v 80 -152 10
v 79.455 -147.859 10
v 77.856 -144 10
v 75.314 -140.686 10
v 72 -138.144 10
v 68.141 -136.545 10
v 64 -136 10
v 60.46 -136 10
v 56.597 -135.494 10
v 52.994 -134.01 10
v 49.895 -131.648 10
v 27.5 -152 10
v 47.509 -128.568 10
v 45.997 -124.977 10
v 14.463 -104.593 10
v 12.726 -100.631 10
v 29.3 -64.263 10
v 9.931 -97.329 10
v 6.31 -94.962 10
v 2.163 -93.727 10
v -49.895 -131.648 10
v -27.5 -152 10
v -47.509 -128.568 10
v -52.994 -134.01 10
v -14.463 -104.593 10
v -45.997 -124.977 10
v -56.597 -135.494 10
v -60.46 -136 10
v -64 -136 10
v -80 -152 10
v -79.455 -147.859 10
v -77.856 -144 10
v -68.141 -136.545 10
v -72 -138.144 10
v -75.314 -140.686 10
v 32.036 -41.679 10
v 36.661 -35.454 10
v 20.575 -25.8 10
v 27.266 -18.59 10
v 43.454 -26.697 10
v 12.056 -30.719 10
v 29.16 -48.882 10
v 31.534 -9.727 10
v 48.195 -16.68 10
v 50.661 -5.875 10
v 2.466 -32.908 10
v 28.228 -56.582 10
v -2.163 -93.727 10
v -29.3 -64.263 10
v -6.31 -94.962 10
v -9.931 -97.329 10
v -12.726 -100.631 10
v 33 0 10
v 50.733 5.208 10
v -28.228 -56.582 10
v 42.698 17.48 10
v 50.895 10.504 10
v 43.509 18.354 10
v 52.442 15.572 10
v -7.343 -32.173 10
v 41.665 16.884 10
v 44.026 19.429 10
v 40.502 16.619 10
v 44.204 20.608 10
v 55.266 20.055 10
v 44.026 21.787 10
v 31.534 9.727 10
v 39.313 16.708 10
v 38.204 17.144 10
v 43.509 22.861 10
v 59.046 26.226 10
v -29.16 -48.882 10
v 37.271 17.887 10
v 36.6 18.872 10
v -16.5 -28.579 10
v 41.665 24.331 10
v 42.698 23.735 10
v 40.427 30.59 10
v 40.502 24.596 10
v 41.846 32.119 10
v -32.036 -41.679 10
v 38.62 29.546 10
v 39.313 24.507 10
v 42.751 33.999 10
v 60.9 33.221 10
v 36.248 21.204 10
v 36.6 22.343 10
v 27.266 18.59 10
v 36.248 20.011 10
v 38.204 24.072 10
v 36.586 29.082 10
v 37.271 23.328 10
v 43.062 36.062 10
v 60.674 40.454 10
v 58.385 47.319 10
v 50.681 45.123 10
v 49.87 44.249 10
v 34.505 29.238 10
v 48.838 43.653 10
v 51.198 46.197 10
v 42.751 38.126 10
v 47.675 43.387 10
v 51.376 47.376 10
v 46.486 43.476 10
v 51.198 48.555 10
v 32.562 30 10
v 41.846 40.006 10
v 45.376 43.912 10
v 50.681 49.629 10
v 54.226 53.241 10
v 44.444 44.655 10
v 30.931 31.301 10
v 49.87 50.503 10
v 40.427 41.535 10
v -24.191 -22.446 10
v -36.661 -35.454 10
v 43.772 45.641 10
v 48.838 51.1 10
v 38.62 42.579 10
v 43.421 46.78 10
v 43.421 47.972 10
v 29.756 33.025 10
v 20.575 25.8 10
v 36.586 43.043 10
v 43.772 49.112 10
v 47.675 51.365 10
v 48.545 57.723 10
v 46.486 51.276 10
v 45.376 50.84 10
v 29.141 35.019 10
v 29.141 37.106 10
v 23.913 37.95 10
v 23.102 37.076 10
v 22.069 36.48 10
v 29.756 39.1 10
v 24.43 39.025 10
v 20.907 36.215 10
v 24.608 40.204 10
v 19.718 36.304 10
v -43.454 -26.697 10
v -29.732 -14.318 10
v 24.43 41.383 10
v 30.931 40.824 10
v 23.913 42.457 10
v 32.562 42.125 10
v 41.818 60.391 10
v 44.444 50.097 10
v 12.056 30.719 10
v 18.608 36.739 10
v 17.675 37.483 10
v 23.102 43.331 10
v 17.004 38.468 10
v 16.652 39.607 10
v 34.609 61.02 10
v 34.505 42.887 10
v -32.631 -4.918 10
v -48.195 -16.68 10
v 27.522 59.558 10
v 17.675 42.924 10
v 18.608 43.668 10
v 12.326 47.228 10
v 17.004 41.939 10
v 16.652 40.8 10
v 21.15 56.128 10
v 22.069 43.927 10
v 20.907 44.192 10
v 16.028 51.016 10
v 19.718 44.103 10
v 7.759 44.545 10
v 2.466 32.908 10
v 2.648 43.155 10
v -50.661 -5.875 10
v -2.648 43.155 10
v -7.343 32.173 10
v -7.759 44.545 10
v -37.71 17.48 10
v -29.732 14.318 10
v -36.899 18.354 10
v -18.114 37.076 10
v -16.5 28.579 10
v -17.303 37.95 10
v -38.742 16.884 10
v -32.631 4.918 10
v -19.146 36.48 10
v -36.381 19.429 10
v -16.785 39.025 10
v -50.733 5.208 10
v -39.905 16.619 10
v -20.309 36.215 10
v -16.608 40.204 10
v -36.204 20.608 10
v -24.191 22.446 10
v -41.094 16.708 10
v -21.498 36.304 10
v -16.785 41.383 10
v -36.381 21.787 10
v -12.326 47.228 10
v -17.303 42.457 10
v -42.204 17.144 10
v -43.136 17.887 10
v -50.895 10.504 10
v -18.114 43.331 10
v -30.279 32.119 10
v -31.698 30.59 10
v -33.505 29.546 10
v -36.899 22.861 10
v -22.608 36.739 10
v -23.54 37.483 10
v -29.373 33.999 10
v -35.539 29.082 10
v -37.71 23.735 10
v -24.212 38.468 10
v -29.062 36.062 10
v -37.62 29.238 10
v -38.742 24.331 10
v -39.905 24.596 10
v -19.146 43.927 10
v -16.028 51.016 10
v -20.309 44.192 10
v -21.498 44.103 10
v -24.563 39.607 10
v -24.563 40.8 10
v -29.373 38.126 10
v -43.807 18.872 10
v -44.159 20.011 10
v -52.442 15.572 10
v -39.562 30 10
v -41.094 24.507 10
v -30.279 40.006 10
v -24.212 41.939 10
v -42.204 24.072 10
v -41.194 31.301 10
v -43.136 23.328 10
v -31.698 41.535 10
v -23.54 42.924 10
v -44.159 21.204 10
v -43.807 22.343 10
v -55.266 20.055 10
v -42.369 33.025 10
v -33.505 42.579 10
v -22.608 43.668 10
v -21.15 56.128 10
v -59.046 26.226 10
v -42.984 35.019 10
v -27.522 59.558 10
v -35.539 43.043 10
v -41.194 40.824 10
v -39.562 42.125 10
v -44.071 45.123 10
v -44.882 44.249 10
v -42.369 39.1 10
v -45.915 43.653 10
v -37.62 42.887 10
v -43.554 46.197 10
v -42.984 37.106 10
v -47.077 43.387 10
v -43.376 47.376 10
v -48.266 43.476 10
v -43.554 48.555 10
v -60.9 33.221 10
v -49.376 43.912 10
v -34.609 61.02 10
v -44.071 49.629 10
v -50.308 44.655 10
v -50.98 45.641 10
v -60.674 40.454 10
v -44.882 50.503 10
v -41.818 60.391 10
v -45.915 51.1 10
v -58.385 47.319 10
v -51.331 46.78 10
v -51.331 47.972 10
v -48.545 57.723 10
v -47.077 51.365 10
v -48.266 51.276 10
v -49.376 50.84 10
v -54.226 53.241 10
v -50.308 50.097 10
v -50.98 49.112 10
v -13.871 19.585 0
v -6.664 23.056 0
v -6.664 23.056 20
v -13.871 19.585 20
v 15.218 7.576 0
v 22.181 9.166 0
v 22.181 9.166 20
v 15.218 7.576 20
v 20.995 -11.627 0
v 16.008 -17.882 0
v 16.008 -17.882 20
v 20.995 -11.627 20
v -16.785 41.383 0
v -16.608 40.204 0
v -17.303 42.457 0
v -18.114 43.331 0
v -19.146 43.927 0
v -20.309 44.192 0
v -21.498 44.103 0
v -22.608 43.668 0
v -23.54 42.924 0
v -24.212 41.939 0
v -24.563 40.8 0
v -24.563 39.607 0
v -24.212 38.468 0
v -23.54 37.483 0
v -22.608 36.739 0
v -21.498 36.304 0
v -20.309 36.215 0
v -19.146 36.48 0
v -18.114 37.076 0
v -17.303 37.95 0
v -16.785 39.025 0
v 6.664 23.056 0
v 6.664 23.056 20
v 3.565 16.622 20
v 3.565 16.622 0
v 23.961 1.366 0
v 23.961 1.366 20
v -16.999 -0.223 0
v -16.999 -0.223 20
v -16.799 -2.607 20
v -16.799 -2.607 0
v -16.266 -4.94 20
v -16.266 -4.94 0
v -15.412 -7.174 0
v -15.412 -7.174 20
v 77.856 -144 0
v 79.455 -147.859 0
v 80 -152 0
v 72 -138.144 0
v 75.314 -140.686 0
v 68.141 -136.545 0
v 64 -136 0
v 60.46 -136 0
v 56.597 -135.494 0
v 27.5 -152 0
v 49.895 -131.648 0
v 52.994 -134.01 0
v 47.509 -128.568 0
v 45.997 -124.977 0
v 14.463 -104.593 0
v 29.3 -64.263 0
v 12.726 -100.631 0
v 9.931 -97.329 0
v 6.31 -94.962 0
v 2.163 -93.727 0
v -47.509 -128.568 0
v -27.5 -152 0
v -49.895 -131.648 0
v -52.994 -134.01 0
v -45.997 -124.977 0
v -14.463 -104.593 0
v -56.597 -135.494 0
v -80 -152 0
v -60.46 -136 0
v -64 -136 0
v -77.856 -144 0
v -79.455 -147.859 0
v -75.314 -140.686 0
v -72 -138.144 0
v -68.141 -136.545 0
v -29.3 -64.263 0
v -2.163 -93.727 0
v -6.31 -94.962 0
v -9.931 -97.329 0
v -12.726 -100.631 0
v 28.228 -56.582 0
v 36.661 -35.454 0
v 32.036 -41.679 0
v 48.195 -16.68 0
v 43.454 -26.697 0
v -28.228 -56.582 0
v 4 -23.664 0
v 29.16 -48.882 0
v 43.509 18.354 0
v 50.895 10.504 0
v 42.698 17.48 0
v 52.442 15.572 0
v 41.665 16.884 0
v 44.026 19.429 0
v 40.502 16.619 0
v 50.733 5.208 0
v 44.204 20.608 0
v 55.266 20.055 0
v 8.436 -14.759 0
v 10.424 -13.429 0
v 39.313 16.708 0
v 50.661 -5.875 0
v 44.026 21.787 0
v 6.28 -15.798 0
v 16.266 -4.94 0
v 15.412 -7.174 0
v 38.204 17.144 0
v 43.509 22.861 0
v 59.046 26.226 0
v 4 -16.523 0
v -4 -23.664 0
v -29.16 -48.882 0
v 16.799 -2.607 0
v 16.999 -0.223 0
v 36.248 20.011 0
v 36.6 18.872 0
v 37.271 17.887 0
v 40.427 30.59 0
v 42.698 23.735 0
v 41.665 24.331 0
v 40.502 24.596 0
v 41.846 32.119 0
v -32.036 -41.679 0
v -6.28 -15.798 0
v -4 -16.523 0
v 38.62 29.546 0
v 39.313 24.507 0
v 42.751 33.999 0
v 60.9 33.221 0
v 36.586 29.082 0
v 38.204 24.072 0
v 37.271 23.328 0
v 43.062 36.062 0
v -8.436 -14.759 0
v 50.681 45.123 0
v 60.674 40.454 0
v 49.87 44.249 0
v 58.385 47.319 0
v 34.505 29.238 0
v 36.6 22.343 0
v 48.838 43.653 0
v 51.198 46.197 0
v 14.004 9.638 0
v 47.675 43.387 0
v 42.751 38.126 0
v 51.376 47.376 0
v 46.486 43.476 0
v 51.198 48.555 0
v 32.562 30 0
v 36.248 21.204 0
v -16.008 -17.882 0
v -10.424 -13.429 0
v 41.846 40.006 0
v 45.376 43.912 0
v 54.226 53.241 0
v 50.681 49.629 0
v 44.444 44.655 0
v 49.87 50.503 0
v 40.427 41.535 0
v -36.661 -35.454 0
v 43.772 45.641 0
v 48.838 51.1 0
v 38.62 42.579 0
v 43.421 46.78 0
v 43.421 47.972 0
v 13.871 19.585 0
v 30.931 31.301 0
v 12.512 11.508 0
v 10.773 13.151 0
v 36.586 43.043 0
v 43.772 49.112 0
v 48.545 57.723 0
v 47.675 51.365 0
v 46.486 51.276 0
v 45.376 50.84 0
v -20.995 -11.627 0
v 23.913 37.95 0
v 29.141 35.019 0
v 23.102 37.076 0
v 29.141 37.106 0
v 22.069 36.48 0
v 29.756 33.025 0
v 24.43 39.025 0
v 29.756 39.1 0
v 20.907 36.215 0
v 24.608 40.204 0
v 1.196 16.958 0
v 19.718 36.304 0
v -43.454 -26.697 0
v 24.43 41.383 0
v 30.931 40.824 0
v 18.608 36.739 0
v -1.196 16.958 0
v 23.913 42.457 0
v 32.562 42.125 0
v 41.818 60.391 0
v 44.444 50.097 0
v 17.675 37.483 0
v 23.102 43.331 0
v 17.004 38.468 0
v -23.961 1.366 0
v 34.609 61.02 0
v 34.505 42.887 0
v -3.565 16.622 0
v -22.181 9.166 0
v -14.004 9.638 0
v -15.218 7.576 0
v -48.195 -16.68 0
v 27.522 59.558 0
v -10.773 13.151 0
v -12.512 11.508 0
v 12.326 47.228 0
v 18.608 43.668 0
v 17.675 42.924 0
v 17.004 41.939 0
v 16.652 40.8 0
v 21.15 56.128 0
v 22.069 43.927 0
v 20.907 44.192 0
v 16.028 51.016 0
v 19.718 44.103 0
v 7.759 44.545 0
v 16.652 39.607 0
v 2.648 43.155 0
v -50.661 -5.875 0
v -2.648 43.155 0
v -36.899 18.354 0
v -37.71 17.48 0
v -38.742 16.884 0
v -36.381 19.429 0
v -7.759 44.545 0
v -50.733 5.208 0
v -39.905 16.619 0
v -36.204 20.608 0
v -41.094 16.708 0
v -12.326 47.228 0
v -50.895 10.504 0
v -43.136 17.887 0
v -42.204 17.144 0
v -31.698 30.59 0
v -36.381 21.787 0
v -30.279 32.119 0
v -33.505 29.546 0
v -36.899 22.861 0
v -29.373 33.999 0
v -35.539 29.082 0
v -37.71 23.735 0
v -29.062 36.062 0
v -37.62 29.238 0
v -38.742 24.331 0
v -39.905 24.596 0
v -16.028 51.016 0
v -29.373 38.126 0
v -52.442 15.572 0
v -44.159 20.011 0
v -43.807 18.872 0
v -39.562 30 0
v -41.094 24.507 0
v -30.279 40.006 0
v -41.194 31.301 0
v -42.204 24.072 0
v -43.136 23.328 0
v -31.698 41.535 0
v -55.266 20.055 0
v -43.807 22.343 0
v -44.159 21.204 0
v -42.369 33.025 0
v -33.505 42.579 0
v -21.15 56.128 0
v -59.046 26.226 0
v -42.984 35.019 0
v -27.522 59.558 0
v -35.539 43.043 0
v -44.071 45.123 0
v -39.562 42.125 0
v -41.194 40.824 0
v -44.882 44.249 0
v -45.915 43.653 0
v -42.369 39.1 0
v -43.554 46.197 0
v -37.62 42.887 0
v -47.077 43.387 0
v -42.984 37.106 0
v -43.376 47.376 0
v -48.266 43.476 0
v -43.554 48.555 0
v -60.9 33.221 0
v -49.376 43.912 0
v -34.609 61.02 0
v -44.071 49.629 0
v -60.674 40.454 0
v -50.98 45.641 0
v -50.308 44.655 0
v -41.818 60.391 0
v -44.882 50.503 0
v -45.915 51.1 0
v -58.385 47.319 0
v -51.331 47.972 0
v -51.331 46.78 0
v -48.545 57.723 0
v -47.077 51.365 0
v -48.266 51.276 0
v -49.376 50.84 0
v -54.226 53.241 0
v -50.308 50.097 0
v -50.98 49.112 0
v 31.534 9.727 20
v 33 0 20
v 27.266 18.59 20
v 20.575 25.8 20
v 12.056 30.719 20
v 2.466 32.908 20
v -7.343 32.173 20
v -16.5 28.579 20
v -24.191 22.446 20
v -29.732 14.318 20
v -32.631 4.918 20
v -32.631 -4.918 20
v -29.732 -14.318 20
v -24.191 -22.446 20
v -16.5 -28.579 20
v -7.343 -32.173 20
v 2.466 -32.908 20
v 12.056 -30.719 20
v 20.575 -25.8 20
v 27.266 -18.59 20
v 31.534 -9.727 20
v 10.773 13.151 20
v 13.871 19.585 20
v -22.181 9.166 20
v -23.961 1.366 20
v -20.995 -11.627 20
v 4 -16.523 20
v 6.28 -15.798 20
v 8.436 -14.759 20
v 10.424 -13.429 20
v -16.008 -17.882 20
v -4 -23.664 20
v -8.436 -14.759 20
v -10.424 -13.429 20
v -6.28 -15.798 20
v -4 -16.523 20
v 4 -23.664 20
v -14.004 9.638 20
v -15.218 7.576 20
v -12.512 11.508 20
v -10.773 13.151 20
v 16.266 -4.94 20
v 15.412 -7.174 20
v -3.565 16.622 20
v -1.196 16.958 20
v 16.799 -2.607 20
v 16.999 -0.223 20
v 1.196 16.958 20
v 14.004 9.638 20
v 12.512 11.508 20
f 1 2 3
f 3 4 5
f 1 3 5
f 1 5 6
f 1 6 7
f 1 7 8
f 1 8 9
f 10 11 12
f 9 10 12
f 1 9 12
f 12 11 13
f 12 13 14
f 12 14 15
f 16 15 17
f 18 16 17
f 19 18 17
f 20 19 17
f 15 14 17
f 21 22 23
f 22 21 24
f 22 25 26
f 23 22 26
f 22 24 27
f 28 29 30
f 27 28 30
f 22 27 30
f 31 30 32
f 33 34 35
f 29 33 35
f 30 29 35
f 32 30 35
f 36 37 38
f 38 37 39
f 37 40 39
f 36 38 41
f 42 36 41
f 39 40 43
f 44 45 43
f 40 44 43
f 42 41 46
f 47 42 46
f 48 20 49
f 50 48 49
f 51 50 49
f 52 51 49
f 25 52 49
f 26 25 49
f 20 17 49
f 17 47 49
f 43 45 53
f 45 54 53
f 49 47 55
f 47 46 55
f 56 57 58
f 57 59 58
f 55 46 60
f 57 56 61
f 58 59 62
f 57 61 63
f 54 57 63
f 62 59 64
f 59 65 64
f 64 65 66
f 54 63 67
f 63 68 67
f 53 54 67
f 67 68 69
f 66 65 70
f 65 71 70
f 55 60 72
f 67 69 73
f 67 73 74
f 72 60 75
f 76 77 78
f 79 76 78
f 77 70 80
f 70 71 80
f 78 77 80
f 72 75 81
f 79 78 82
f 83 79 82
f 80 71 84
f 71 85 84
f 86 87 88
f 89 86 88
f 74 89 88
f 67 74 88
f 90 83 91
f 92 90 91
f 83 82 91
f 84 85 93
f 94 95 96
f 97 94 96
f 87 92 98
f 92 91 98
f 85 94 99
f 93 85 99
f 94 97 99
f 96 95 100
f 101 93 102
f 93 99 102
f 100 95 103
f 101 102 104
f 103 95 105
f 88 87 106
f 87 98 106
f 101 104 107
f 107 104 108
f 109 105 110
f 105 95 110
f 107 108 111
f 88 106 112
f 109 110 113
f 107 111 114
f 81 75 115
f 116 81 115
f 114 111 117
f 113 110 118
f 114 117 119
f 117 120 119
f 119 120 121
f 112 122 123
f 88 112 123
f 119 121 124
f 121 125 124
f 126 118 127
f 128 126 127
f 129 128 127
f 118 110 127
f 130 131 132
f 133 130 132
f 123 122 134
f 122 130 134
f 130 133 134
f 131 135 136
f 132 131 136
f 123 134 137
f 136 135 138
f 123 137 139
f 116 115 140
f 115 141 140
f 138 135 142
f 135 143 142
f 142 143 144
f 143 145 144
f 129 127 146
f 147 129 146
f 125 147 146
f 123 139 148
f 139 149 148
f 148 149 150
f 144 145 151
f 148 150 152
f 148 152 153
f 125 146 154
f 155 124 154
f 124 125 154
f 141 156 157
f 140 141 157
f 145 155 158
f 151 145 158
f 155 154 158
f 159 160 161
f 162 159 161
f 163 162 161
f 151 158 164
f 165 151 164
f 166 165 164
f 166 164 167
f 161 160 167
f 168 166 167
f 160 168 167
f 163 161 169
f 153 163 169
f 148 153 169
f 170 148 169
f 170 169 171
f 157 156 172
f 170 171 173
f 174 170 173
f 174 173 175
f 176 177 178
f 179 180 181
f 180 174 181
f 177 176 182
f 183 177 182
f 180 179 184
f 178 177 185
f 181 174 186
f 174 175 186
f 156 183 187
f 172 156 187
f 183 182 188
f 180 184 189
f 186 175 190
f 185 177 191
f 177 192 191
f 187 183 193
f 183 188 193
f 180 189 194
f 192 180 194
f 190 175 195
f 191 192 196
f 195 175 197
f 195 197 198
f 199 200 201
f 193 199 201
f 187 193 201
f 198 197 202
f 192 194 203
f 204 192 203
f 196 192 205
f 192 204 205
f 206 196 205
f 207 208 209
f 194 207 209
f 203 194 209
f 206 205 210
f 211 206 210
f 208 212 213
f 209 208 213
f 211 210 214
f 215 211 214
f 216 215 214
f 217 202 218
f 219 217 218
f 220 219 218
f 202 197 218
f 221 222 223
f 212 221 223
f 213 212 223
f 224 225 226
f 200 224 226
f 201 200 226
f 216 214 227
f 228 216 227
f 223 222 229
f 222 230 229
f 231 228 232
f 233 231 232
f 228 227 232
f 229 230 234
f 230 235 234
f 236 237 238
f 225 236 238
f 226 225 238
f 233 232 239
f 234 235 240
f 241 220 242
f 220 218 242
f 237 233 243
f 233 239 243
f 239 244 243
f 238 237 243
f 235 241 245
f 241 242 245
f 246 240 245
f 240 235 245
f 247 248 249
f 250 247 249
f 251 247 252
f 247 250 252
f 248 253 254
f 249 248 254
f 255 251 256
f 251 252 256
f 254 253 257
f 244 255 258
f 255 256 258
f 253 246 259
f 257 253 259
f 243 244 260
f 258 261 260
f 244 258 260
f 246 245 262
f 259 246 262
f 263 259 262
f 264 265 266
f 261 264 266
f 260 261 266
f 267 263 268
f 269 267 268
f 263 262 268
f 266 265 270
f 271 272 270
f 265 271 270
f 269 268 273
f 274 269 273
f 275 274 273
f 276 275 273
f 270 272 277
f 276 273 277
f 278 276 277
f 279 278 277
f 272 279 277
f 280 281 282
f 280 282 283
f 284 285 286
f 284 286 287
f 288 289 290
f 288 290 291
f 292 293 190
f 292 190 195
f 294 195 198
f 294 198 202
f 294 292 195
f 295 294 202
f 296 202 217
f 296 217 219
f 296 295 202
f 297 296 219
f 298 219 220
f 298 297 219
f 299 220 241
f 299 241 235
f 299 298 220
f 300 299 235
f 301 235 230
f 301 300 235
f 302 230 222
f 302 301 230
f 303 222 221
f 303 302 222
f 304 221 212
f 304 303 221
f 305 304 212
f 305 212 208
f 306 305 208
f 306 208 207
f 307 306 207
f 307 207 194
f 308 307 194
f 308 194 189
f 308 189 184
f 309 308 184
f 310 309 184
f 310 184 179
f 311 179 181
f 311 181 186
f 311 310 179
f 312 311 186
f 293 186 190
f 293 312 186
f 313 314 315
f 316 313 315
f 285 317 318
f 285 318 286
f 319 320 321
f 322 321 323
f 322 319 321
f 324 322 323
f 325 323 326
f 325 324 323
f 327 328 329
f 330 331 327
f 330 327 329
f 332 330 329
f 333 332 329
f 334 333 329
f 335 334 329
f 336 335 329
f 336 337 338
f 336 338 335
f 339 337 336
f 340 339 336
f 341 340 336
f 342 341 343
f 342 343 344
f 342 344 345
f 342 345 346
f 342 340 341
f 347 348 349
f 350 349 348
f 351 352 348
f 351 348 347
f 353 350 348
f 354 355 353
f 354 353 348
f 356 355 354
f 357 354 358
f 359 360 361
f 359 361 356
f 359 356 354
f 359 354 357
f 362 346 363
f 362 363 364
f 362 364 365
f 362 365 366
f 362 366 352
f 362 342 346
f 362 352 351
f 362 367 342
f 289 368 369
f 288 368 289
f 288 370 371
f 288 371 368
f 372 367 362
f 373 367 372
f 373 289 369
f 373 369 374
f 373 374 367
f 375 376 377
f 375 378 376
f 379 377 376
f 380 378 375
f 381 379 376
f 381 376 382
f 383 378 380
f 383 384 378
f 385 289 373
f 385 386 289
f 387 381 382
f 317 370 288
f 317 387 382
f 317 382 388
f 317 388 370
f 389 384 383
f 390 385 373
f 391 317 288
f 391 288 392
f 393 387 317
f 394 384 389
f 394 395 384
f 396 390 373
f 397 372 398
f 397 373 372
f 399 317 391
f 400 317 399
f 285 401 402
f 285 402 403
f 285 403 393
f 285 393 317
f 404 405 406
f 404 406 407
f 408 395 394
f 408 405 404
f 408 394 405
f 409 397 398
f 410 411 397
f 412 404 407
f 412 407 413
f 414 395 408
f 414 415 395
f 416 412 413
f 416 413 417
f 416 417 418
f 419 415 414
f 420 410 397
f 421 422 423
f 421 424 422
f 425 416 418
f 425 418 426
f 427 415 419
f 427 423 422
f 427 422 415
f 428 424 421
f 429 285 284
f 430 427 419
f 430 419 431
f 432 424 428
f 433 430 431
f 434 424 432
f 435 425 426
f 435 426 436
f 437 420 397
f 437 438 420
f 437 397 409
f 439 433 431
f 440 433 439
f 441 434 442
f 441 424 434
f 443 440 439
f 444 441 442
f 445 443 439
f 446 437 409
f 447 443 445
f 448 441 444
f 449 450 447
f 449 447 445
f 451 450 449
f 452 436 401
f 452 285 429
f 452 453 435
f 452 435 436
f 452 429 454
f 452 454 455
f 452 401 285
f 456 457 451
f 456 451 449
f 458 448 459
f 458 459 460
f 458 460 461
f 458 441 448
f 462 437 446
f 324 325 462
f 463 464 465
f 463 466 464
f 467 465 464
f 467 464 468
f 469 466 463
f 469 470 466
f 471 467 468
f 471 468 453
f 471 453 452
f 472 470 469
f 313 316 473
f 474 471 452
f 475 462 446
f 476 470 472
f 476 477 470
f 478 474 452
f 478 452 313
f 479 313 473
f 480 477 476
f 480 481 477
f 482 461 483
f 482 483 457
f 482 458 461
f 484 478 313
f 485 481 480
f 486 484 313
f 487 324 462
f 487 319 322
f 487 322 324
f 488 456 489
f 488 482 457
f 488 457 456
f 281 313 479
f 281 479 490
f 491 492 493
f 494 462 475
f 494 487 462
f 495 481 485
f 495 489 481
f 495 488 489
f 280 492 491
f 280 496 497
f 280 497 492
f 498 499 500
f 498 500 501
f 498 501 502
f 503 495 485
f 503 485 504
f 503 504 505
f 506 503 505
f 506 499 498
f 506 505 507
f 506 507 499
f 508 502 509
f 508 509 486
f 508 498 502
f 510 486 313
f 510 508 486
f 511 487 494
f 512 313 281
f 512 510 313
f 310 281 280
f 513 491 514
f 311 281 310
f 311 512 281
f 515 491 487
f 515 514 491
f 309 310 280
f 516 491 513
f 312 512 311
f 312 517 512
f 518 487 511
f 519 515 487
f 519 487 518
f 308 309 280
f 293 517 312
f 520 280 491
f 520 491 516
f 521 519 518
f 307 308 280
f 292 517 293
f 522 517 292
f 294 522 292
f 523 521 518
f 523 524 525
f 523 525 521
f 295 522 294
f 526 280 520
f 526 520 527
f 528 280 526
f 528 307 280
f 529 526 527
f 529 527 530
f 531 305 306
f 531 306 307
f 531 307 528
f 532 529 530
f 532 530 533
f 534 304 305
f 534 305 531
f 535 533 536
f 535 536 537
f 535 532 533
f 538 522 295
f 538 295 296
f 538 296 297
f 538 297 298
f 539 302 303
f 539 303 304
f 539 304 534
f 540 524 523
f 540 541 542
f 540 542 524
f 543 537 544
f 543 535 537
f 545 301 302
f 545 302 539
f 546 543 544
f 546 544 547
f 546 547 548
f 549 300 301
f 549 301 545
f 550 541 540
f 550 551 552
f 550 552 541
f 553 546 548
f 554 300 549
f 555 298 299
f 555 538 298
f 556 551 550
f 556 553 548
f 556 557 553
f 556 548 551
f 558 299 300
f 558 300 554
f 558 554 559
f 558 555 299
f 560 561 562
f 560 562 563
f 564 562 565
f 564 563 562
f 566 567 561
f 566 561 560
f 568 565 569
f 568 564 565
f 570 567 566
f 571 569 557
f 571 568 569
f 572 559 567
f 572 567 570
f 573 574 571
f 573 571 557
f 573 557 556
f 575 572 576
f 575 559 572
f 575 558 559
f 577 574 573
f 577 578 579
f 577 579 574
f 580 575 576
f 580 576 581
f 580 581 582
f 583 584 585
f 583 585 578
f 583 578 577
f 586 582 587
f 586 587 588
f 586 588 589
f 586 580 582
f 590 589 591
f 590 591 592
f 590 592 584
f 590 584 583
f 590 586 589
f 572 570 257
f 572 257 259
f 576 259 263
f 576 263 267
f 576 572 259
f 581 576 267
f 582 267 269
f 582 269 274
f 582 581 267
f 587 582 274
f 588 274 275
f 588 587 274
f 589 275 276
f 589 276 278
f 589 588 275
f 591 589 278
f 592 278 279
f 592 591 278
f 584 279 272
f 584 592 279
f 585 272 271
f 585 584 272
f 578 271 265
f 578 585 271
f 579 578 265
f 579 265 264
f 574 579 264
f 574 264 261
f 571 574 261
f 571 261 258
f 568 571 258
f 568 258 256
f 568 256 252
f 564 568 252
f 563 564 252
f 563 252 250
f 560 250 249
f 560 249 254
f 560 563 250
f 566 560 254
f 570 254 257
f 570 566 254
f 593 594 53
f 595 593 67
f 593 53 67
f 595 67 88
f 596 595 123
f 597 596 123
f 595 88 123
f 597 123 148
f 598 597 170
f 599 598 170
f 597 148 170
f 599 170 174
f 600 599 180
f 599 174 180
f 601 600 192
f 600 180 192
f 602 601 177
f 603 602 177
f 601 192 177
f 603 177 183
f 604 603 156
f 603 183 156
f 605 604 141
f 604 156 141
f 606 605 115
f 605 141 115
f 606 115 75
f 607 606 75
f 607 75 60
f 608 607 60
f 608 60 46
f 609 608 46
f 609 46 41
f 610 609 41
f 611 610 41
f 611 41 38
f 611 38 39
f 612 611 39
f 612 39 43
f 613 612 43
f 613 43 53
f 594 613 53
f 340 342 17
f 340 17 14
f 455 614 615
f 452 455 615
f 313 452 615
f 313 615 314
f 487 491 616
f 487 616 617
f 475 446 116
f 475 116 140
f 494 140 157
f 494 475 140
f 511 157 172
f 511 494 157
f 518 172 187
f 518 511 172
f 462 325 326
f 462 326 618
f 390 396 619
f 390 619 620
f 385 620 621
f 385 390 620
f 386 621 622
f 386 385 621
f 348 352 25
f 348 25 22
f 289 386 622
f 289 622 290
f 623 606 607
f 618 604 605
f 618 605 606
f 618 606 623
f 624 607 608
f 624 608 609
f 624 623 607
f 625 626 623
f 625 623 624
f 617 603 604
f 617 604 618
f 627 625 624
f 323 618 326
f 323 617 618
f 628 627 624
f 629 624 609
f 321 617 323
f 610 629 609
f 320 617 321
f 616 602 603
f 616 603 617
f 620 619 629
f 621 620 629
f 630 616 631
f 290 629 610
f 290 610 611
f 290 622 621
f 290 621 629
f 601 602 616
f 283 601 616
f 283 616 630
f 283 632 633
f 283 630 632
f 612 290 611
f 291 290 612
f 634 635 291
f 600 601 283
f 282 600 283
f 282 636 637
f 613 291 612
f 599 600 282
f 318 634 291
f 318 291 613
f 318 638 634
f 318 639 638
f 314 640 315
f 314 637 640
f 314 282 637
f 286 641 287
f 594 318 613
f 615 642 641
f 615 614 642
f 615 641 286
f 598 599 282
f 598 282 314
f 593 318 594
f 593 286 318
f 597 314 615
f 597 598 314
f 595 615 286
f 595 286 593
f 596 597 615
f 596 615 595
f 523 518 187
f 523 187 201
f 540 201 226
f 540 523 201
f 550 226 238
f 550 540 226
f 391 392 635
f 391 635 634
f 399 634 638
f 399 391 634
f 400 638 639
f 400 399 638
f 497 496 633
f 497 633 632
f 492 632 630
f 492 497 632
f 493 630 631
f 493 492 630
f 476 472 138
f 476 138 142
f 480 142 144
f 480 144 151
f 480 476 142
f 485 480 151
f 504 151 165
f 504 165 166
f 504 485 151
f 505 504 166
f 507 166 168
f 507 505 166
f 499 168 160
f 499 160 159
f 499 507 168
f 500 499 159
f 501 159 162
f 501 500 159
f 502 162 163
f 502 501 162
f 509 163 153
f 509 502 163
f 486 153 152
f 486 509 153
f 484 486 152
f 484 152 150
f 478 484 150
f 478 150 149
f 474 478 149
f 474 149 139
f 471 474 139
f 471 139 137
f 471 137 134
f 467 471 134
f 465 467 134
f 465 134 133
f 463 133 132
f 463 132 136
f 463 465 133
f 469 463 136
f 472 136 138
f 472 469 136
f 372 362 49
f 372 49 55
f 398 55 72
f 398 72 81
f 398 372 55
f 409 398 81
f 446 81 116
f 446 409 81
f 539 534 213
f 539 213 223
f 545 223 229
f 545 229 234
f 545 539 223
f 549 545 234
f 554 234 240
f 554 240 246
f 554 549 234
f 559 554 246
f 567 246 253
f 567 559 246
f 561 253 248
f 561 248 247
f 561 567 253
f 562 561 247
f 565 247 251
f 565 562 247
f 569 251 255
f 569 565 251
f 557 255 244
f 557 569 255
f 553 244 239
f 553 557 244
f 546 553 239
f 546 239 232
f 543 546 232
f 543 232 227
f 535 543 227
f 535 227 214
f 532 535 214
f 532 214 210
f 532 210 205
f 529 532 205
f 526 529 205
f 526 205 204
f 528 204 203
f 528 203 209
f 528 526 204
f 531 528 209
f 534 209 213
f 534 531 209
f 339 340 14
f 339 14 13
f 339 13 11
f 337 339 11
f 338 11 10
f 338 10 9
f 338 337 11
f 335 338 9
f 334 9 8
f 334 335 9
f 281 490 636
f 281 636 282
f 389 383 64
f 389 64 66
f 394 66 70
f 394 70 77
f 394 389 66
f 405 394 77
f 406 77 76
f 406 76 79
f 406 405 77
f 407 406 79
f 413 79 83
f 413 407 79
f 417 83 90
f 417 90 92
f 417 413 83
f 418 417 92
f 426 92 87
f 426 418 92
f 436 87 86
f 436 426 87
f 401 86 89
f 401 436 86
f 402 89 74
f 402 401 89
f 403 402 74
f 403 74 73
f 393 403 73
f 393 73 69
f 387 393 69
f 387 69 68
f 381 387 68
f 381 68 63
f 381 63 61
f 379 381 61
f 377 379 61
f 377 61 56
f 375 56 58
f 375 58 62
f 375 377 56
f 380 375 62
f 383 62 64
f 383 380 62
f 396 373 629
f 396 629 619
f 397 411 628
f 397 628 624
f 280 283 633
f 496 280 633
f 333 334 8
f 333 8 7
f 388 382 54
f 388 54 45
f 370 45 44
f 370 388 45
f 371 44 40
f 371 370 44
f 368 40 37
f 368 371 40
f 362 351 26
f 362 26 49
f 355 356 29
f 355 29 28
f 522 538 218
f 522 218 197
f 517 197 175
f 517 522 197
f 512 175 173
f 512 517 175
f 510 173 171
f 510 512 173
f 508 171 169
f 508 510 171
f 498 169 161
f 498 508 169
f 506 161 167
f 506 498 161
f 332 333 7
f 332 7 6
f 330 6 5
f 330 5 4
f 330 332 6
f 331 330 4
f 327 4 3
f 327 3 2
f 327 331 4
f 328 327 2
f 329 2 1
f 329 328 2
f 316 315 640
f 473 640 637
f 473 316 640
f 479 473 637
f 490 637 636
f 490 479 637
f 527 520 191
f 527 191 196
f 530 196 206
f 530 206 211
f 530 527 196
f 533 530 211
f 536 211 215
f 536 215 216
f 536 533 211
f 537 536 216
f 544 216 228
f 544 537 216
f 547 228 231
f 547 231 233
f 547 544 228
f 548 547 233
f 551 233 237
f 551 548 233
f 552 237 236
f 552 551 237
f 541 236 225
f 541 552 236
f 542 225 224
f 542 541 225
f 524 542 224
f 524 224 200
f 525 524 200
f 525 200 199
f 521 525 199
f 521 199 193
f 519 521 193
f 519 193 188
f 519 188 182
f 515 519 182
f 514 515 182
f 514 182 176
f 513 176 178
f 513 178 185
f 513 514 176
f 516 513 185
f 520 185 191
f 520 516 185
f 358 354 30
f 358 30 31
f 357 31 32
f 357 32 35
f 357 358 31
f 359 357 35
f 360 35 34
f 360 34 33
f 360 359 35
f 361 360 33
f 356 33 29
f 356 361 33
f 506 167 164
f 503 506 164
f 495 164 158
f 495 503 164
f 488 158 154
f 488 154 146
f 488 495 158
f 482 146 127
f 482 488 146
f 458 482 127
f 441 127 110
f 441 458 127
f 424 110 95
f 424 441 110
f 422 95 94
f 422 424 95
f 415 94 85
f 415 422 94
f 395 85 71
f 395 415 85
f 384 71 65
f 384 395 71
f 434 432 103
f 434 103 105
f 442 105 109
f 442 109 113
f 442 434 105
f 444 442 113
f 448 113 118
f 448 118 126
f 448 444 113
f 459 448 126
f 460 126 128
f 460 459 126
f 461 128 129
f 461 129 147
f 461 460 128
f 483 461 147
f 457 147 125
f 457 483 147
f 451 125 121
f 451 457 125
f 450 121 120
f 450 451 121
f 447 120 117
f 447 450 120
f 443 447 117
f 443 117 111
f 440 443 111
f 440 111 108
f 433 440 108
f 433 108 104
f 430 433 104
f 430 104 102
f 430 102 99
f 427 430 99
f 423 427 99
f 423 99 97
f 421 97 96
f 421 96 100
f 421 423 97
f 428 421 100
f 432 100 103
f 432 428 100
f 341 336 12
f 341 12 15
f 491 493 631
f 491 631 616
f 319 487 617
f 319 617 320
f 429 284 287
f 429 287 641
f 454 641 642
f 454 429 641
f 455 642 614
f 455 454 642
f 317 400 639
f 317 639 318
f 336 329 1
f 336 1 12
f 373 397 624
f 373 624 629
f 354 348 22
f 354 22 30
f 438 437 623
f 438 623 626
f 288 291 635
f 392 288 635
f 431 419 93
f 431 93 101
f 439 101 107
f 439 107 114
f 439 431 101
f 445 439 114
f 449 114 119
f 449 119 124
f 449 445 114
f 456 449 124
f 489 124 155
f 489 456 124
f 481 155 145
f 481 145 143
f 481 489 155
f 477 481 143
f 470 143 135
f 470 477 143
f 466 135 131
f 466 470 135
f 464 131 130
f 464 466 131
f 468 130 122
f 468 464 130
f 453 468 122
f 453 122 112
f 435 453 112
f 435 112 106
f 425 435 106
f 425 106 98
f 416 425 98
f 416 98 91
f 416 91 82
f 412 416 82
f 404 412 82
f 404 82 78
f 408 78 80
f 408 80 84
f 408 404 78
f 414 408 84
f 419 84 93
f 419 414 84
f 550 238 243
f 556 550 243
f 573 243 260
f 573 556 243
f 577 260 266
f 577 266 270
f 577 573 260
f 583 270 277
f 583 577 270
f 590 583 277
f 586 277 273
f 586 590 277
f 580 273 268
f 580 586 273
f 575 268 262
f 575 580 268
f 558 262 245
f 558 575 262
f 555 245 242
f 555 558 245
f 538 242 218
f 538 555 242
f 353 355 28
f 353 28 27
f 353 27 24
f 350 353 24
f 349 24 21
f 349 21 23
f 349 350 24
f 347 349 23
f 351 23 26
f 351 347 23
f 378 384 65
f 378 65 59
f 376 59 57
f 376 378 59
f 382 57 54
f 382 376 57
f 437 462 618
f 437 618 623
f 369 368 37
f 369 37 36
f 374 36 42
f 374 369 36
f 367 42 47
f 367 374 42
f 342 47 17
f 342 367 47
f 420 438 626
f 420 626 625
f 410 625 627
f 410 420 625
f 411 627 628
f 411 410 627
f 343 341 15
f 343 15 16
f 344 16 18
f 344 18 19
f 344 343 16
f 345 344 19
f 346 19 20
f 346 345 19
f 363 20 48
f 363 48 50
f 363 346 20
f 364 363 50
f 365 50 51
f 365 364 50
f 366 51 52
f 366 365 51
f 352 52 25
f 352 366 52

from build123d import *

# Parameters (mm, degrees)
SKETCH_1_R      = 4
SKETCH_1_R_2    = 7
SKETCH_1_R_3    = 33
EXTRUDE_1_DEPTH = 10
SKETCH_1_3_R    = 33
EXTRUDE_2_DEPTH = 20


with BuildPart() as part:
    # Эскиз1 → Бобышка-Вытянуть1 (new body)
    with BuildSketch(Plane.XY):
        with BuildLine():
            ThreePointArc((-64, -136), (-75.313708499, -140.686291501), (-80, -152))
            Line((-80, -152), (-27.5, -152))
            Line((-27.5, -152), (-14.463080892, -104.593021426))
            ThreePointArc((-14.463080892, -104.593021426), (0, -93.570368671), (14.463080892, -104.593021426))
            Line((14.463080892, -104.593021426), (27.5, -152))
            Line((27.5, -152), (80, -152))
            ThreePointArc((80, -152), (75.313708499, -140.686291501), (64, -136))
            Line((64, -136), (60.459937025, -136))
            ThreePointArc((60.459937025, -136), (51.367638325, -132.930218118), (45.996856133, -124.977347245))
            Line((45.996856133, -124.977347245), (29.300488581, -64.26328342))
            ThreePointArc((29.300488581, -64.26328342), (29.160343249, -48.882298429), (36.661224304, -35.453555993))
            ThreePointArc((36.661224304, -35.453555993), (48.195333852, -16.679622146), (50.733420691, 5.207689026))
            ThreePointArc((50.733420691, 5.207689026), (51.500326923, 13.089309145), (55.266020254, 20.05548705))
            ThreePointArc((55.266020254, 20.05548705), (51.548317959, 55.688646816), (16.027753707, 51.016077878))
            ThreePointArc((16.027753707, 51.016077878), (0, 42.978983508), (-16.027753707, 51.016077878))
            ThreePointArc((-16.027753707, 51.016077878), (-51.548317959, 55.688646816), (-55.266020254, 20.05548705))
            ThreePointArc((-55.266020254, 20.05548705), (-51.500326923, 13.089309145), (-50.733420691, 5.207689026))
            ThreePointArc((-50.733420691, 5.207689026), (-48.195333852, -16.679622146), (-36.661224304, -35.453555993))
            ThreePointArc((-36.661224304, -35.453555993), (-29.160343249, -48.882298429), (-29.300488581, -64.26328342))
            Line((-29.300488581, -64.26328342), (-45.996856133, -124.977347245))
            ThreePointArc((-45.996856133, -124.977347245), (-51.367638325, -132.930218118), (-60.459937025, -136))
            Line((-60.459937025, -136), (-64, -136))
        make_face()
        with Locations((-40.203550562, 20.60763262)):
            Circle(SKETCH_1_R, mode=Mode.SUBTRACT)
        with Locations((-47.376154339, 47.376154339)):
            Circle(SKETCH_1_R, mode=Mode.SUBTRACT)
        with Locations((-36.062445841, 36.062445841)):
            Circle(SKETCH_1_R_2, mode=Mode.SUBTRACT)
        with Locations((-20.60763262, 40.203550562)):
            Circle(SKETCH_1_R, mode=Mode.SUBTRACT)
        Circle(SKETCH_1_R_3, mode=Mode.SUBTRACT)
        with Locations((20.60763262, 40.203550562)):
            Circle(SKETCH_1_R, mode=Mode.SUBTRACT)
        with Locations((36.062445841, 36.062445841)):
            Circle(SKETCH_1_R_2, mode=Mode.SUBTRACT)
        with Locations((40.203550562, 20.60763262)):
            Circle(SKETCH_1_R, mode=Mode.SUBTRACT)
        with Locations((47.376154339, 47.376154339)):
            Circle(SKETCH_1_R, mode=Mode.SUBTRACT)
    extrude(amount=EXTRUDE_1_DEPTH)

    # Эскиз1<3> → Бобышка-Вытянуть2 (add)
    with BuildSketch(Plane.XY):
        Circle(SKETCH_1_3_R)
        with BuildLine():
            Line((-4, -23.664319132), (-4, -16.522711642))
            ThreePointArc((-4, -16.522711642), (-7.376023565, -15.316470754), (-10.42401693, -13.429068138))
            Line((-10.42401693, -13.429068138), (-16.007550501, -17.881787577))
            Line((-16.007550501, -17.881787577), (-20.995468916, -11.627135717))
            Line((-20.995468916, -11.627135717), (-15.411935345, -7.174416278))
            ThreePointArc((-15.411935345, -7.174416278), (-16.573774507, -3.782855877), (-16.9985365, -0.223062423))
            Line((-16.9985365, -0.223062423), (-23.961088981, 1.366094746))
            Line((-23.961088981, 1.366094746), (-22.180921509, 9.165518044))
            Line((-22.180921509, 9.165518044), (-15.218369029, 7.576360875))
            ThreePointArc((-15.218369029, 7.576360875), (-13.291135202, 10.599326632), (-10.772811379, 13.150913846))
            Line((-10.772811379, 13.150913846), (-13.87143874, 19.585279862))
            Line((-13.87143874, 19.585279862), (-6.663687797, 23.056349775))
            Line((-6.663687797, 23.056349775), (-3.565060436, 16.621983759))
            ThreePointArc((-3.565060436, 16.621983759), (0, 17), (3.565060436, 16.621983759))
            Line((3.565060436, 16.621983759), (6.663687797, 23.056349775))
            Line((6.663687797, 23.056349775), (13.87143874, 19.585279862))
            Line((13.87143874, 19.585279862), (10.772811379, 13.150913846))
            ThreePointArc((10.772811379, 13.150913846), (13.291135202, 10.599326632), (15.218369029, 7.576360875))
            Line((15.218369029, 7.576360875), (22.180921509, 9.165518044))
            Line((22.180921509, 9.165518044), (23.961088981, 1.366094746))
            Line((23.961088981, 1.366094746), (16.9985365, -0.223062423))
            ThreePointArc((16.9985365, -0.223062423), (16.573774507, -3.782855877), (15.411935345, -7.174416278))
            Line((15.411935345, -7.174416278), (20.995468916, -11.627135717))
            Line((20.995468916, -11.627135717), (16.007550501, -17.881787577))
            Line((16.007550501, -17.881787577), (10.42401693, -13.429068138))
            ThreePointArc((10.42401693, -13.429068138), (7.376023565, -15.316470754), (4, -16.522711642))
            Line((4, -16.522711642), (4, -23.664319132))
            Line((4, -23.664319132), (-4, -23.664319132))
        make_face(mode=Mode.SUBTRACT)
    extrude(amount=EXTRUDE_2_DEPTH)


solid = part.part
